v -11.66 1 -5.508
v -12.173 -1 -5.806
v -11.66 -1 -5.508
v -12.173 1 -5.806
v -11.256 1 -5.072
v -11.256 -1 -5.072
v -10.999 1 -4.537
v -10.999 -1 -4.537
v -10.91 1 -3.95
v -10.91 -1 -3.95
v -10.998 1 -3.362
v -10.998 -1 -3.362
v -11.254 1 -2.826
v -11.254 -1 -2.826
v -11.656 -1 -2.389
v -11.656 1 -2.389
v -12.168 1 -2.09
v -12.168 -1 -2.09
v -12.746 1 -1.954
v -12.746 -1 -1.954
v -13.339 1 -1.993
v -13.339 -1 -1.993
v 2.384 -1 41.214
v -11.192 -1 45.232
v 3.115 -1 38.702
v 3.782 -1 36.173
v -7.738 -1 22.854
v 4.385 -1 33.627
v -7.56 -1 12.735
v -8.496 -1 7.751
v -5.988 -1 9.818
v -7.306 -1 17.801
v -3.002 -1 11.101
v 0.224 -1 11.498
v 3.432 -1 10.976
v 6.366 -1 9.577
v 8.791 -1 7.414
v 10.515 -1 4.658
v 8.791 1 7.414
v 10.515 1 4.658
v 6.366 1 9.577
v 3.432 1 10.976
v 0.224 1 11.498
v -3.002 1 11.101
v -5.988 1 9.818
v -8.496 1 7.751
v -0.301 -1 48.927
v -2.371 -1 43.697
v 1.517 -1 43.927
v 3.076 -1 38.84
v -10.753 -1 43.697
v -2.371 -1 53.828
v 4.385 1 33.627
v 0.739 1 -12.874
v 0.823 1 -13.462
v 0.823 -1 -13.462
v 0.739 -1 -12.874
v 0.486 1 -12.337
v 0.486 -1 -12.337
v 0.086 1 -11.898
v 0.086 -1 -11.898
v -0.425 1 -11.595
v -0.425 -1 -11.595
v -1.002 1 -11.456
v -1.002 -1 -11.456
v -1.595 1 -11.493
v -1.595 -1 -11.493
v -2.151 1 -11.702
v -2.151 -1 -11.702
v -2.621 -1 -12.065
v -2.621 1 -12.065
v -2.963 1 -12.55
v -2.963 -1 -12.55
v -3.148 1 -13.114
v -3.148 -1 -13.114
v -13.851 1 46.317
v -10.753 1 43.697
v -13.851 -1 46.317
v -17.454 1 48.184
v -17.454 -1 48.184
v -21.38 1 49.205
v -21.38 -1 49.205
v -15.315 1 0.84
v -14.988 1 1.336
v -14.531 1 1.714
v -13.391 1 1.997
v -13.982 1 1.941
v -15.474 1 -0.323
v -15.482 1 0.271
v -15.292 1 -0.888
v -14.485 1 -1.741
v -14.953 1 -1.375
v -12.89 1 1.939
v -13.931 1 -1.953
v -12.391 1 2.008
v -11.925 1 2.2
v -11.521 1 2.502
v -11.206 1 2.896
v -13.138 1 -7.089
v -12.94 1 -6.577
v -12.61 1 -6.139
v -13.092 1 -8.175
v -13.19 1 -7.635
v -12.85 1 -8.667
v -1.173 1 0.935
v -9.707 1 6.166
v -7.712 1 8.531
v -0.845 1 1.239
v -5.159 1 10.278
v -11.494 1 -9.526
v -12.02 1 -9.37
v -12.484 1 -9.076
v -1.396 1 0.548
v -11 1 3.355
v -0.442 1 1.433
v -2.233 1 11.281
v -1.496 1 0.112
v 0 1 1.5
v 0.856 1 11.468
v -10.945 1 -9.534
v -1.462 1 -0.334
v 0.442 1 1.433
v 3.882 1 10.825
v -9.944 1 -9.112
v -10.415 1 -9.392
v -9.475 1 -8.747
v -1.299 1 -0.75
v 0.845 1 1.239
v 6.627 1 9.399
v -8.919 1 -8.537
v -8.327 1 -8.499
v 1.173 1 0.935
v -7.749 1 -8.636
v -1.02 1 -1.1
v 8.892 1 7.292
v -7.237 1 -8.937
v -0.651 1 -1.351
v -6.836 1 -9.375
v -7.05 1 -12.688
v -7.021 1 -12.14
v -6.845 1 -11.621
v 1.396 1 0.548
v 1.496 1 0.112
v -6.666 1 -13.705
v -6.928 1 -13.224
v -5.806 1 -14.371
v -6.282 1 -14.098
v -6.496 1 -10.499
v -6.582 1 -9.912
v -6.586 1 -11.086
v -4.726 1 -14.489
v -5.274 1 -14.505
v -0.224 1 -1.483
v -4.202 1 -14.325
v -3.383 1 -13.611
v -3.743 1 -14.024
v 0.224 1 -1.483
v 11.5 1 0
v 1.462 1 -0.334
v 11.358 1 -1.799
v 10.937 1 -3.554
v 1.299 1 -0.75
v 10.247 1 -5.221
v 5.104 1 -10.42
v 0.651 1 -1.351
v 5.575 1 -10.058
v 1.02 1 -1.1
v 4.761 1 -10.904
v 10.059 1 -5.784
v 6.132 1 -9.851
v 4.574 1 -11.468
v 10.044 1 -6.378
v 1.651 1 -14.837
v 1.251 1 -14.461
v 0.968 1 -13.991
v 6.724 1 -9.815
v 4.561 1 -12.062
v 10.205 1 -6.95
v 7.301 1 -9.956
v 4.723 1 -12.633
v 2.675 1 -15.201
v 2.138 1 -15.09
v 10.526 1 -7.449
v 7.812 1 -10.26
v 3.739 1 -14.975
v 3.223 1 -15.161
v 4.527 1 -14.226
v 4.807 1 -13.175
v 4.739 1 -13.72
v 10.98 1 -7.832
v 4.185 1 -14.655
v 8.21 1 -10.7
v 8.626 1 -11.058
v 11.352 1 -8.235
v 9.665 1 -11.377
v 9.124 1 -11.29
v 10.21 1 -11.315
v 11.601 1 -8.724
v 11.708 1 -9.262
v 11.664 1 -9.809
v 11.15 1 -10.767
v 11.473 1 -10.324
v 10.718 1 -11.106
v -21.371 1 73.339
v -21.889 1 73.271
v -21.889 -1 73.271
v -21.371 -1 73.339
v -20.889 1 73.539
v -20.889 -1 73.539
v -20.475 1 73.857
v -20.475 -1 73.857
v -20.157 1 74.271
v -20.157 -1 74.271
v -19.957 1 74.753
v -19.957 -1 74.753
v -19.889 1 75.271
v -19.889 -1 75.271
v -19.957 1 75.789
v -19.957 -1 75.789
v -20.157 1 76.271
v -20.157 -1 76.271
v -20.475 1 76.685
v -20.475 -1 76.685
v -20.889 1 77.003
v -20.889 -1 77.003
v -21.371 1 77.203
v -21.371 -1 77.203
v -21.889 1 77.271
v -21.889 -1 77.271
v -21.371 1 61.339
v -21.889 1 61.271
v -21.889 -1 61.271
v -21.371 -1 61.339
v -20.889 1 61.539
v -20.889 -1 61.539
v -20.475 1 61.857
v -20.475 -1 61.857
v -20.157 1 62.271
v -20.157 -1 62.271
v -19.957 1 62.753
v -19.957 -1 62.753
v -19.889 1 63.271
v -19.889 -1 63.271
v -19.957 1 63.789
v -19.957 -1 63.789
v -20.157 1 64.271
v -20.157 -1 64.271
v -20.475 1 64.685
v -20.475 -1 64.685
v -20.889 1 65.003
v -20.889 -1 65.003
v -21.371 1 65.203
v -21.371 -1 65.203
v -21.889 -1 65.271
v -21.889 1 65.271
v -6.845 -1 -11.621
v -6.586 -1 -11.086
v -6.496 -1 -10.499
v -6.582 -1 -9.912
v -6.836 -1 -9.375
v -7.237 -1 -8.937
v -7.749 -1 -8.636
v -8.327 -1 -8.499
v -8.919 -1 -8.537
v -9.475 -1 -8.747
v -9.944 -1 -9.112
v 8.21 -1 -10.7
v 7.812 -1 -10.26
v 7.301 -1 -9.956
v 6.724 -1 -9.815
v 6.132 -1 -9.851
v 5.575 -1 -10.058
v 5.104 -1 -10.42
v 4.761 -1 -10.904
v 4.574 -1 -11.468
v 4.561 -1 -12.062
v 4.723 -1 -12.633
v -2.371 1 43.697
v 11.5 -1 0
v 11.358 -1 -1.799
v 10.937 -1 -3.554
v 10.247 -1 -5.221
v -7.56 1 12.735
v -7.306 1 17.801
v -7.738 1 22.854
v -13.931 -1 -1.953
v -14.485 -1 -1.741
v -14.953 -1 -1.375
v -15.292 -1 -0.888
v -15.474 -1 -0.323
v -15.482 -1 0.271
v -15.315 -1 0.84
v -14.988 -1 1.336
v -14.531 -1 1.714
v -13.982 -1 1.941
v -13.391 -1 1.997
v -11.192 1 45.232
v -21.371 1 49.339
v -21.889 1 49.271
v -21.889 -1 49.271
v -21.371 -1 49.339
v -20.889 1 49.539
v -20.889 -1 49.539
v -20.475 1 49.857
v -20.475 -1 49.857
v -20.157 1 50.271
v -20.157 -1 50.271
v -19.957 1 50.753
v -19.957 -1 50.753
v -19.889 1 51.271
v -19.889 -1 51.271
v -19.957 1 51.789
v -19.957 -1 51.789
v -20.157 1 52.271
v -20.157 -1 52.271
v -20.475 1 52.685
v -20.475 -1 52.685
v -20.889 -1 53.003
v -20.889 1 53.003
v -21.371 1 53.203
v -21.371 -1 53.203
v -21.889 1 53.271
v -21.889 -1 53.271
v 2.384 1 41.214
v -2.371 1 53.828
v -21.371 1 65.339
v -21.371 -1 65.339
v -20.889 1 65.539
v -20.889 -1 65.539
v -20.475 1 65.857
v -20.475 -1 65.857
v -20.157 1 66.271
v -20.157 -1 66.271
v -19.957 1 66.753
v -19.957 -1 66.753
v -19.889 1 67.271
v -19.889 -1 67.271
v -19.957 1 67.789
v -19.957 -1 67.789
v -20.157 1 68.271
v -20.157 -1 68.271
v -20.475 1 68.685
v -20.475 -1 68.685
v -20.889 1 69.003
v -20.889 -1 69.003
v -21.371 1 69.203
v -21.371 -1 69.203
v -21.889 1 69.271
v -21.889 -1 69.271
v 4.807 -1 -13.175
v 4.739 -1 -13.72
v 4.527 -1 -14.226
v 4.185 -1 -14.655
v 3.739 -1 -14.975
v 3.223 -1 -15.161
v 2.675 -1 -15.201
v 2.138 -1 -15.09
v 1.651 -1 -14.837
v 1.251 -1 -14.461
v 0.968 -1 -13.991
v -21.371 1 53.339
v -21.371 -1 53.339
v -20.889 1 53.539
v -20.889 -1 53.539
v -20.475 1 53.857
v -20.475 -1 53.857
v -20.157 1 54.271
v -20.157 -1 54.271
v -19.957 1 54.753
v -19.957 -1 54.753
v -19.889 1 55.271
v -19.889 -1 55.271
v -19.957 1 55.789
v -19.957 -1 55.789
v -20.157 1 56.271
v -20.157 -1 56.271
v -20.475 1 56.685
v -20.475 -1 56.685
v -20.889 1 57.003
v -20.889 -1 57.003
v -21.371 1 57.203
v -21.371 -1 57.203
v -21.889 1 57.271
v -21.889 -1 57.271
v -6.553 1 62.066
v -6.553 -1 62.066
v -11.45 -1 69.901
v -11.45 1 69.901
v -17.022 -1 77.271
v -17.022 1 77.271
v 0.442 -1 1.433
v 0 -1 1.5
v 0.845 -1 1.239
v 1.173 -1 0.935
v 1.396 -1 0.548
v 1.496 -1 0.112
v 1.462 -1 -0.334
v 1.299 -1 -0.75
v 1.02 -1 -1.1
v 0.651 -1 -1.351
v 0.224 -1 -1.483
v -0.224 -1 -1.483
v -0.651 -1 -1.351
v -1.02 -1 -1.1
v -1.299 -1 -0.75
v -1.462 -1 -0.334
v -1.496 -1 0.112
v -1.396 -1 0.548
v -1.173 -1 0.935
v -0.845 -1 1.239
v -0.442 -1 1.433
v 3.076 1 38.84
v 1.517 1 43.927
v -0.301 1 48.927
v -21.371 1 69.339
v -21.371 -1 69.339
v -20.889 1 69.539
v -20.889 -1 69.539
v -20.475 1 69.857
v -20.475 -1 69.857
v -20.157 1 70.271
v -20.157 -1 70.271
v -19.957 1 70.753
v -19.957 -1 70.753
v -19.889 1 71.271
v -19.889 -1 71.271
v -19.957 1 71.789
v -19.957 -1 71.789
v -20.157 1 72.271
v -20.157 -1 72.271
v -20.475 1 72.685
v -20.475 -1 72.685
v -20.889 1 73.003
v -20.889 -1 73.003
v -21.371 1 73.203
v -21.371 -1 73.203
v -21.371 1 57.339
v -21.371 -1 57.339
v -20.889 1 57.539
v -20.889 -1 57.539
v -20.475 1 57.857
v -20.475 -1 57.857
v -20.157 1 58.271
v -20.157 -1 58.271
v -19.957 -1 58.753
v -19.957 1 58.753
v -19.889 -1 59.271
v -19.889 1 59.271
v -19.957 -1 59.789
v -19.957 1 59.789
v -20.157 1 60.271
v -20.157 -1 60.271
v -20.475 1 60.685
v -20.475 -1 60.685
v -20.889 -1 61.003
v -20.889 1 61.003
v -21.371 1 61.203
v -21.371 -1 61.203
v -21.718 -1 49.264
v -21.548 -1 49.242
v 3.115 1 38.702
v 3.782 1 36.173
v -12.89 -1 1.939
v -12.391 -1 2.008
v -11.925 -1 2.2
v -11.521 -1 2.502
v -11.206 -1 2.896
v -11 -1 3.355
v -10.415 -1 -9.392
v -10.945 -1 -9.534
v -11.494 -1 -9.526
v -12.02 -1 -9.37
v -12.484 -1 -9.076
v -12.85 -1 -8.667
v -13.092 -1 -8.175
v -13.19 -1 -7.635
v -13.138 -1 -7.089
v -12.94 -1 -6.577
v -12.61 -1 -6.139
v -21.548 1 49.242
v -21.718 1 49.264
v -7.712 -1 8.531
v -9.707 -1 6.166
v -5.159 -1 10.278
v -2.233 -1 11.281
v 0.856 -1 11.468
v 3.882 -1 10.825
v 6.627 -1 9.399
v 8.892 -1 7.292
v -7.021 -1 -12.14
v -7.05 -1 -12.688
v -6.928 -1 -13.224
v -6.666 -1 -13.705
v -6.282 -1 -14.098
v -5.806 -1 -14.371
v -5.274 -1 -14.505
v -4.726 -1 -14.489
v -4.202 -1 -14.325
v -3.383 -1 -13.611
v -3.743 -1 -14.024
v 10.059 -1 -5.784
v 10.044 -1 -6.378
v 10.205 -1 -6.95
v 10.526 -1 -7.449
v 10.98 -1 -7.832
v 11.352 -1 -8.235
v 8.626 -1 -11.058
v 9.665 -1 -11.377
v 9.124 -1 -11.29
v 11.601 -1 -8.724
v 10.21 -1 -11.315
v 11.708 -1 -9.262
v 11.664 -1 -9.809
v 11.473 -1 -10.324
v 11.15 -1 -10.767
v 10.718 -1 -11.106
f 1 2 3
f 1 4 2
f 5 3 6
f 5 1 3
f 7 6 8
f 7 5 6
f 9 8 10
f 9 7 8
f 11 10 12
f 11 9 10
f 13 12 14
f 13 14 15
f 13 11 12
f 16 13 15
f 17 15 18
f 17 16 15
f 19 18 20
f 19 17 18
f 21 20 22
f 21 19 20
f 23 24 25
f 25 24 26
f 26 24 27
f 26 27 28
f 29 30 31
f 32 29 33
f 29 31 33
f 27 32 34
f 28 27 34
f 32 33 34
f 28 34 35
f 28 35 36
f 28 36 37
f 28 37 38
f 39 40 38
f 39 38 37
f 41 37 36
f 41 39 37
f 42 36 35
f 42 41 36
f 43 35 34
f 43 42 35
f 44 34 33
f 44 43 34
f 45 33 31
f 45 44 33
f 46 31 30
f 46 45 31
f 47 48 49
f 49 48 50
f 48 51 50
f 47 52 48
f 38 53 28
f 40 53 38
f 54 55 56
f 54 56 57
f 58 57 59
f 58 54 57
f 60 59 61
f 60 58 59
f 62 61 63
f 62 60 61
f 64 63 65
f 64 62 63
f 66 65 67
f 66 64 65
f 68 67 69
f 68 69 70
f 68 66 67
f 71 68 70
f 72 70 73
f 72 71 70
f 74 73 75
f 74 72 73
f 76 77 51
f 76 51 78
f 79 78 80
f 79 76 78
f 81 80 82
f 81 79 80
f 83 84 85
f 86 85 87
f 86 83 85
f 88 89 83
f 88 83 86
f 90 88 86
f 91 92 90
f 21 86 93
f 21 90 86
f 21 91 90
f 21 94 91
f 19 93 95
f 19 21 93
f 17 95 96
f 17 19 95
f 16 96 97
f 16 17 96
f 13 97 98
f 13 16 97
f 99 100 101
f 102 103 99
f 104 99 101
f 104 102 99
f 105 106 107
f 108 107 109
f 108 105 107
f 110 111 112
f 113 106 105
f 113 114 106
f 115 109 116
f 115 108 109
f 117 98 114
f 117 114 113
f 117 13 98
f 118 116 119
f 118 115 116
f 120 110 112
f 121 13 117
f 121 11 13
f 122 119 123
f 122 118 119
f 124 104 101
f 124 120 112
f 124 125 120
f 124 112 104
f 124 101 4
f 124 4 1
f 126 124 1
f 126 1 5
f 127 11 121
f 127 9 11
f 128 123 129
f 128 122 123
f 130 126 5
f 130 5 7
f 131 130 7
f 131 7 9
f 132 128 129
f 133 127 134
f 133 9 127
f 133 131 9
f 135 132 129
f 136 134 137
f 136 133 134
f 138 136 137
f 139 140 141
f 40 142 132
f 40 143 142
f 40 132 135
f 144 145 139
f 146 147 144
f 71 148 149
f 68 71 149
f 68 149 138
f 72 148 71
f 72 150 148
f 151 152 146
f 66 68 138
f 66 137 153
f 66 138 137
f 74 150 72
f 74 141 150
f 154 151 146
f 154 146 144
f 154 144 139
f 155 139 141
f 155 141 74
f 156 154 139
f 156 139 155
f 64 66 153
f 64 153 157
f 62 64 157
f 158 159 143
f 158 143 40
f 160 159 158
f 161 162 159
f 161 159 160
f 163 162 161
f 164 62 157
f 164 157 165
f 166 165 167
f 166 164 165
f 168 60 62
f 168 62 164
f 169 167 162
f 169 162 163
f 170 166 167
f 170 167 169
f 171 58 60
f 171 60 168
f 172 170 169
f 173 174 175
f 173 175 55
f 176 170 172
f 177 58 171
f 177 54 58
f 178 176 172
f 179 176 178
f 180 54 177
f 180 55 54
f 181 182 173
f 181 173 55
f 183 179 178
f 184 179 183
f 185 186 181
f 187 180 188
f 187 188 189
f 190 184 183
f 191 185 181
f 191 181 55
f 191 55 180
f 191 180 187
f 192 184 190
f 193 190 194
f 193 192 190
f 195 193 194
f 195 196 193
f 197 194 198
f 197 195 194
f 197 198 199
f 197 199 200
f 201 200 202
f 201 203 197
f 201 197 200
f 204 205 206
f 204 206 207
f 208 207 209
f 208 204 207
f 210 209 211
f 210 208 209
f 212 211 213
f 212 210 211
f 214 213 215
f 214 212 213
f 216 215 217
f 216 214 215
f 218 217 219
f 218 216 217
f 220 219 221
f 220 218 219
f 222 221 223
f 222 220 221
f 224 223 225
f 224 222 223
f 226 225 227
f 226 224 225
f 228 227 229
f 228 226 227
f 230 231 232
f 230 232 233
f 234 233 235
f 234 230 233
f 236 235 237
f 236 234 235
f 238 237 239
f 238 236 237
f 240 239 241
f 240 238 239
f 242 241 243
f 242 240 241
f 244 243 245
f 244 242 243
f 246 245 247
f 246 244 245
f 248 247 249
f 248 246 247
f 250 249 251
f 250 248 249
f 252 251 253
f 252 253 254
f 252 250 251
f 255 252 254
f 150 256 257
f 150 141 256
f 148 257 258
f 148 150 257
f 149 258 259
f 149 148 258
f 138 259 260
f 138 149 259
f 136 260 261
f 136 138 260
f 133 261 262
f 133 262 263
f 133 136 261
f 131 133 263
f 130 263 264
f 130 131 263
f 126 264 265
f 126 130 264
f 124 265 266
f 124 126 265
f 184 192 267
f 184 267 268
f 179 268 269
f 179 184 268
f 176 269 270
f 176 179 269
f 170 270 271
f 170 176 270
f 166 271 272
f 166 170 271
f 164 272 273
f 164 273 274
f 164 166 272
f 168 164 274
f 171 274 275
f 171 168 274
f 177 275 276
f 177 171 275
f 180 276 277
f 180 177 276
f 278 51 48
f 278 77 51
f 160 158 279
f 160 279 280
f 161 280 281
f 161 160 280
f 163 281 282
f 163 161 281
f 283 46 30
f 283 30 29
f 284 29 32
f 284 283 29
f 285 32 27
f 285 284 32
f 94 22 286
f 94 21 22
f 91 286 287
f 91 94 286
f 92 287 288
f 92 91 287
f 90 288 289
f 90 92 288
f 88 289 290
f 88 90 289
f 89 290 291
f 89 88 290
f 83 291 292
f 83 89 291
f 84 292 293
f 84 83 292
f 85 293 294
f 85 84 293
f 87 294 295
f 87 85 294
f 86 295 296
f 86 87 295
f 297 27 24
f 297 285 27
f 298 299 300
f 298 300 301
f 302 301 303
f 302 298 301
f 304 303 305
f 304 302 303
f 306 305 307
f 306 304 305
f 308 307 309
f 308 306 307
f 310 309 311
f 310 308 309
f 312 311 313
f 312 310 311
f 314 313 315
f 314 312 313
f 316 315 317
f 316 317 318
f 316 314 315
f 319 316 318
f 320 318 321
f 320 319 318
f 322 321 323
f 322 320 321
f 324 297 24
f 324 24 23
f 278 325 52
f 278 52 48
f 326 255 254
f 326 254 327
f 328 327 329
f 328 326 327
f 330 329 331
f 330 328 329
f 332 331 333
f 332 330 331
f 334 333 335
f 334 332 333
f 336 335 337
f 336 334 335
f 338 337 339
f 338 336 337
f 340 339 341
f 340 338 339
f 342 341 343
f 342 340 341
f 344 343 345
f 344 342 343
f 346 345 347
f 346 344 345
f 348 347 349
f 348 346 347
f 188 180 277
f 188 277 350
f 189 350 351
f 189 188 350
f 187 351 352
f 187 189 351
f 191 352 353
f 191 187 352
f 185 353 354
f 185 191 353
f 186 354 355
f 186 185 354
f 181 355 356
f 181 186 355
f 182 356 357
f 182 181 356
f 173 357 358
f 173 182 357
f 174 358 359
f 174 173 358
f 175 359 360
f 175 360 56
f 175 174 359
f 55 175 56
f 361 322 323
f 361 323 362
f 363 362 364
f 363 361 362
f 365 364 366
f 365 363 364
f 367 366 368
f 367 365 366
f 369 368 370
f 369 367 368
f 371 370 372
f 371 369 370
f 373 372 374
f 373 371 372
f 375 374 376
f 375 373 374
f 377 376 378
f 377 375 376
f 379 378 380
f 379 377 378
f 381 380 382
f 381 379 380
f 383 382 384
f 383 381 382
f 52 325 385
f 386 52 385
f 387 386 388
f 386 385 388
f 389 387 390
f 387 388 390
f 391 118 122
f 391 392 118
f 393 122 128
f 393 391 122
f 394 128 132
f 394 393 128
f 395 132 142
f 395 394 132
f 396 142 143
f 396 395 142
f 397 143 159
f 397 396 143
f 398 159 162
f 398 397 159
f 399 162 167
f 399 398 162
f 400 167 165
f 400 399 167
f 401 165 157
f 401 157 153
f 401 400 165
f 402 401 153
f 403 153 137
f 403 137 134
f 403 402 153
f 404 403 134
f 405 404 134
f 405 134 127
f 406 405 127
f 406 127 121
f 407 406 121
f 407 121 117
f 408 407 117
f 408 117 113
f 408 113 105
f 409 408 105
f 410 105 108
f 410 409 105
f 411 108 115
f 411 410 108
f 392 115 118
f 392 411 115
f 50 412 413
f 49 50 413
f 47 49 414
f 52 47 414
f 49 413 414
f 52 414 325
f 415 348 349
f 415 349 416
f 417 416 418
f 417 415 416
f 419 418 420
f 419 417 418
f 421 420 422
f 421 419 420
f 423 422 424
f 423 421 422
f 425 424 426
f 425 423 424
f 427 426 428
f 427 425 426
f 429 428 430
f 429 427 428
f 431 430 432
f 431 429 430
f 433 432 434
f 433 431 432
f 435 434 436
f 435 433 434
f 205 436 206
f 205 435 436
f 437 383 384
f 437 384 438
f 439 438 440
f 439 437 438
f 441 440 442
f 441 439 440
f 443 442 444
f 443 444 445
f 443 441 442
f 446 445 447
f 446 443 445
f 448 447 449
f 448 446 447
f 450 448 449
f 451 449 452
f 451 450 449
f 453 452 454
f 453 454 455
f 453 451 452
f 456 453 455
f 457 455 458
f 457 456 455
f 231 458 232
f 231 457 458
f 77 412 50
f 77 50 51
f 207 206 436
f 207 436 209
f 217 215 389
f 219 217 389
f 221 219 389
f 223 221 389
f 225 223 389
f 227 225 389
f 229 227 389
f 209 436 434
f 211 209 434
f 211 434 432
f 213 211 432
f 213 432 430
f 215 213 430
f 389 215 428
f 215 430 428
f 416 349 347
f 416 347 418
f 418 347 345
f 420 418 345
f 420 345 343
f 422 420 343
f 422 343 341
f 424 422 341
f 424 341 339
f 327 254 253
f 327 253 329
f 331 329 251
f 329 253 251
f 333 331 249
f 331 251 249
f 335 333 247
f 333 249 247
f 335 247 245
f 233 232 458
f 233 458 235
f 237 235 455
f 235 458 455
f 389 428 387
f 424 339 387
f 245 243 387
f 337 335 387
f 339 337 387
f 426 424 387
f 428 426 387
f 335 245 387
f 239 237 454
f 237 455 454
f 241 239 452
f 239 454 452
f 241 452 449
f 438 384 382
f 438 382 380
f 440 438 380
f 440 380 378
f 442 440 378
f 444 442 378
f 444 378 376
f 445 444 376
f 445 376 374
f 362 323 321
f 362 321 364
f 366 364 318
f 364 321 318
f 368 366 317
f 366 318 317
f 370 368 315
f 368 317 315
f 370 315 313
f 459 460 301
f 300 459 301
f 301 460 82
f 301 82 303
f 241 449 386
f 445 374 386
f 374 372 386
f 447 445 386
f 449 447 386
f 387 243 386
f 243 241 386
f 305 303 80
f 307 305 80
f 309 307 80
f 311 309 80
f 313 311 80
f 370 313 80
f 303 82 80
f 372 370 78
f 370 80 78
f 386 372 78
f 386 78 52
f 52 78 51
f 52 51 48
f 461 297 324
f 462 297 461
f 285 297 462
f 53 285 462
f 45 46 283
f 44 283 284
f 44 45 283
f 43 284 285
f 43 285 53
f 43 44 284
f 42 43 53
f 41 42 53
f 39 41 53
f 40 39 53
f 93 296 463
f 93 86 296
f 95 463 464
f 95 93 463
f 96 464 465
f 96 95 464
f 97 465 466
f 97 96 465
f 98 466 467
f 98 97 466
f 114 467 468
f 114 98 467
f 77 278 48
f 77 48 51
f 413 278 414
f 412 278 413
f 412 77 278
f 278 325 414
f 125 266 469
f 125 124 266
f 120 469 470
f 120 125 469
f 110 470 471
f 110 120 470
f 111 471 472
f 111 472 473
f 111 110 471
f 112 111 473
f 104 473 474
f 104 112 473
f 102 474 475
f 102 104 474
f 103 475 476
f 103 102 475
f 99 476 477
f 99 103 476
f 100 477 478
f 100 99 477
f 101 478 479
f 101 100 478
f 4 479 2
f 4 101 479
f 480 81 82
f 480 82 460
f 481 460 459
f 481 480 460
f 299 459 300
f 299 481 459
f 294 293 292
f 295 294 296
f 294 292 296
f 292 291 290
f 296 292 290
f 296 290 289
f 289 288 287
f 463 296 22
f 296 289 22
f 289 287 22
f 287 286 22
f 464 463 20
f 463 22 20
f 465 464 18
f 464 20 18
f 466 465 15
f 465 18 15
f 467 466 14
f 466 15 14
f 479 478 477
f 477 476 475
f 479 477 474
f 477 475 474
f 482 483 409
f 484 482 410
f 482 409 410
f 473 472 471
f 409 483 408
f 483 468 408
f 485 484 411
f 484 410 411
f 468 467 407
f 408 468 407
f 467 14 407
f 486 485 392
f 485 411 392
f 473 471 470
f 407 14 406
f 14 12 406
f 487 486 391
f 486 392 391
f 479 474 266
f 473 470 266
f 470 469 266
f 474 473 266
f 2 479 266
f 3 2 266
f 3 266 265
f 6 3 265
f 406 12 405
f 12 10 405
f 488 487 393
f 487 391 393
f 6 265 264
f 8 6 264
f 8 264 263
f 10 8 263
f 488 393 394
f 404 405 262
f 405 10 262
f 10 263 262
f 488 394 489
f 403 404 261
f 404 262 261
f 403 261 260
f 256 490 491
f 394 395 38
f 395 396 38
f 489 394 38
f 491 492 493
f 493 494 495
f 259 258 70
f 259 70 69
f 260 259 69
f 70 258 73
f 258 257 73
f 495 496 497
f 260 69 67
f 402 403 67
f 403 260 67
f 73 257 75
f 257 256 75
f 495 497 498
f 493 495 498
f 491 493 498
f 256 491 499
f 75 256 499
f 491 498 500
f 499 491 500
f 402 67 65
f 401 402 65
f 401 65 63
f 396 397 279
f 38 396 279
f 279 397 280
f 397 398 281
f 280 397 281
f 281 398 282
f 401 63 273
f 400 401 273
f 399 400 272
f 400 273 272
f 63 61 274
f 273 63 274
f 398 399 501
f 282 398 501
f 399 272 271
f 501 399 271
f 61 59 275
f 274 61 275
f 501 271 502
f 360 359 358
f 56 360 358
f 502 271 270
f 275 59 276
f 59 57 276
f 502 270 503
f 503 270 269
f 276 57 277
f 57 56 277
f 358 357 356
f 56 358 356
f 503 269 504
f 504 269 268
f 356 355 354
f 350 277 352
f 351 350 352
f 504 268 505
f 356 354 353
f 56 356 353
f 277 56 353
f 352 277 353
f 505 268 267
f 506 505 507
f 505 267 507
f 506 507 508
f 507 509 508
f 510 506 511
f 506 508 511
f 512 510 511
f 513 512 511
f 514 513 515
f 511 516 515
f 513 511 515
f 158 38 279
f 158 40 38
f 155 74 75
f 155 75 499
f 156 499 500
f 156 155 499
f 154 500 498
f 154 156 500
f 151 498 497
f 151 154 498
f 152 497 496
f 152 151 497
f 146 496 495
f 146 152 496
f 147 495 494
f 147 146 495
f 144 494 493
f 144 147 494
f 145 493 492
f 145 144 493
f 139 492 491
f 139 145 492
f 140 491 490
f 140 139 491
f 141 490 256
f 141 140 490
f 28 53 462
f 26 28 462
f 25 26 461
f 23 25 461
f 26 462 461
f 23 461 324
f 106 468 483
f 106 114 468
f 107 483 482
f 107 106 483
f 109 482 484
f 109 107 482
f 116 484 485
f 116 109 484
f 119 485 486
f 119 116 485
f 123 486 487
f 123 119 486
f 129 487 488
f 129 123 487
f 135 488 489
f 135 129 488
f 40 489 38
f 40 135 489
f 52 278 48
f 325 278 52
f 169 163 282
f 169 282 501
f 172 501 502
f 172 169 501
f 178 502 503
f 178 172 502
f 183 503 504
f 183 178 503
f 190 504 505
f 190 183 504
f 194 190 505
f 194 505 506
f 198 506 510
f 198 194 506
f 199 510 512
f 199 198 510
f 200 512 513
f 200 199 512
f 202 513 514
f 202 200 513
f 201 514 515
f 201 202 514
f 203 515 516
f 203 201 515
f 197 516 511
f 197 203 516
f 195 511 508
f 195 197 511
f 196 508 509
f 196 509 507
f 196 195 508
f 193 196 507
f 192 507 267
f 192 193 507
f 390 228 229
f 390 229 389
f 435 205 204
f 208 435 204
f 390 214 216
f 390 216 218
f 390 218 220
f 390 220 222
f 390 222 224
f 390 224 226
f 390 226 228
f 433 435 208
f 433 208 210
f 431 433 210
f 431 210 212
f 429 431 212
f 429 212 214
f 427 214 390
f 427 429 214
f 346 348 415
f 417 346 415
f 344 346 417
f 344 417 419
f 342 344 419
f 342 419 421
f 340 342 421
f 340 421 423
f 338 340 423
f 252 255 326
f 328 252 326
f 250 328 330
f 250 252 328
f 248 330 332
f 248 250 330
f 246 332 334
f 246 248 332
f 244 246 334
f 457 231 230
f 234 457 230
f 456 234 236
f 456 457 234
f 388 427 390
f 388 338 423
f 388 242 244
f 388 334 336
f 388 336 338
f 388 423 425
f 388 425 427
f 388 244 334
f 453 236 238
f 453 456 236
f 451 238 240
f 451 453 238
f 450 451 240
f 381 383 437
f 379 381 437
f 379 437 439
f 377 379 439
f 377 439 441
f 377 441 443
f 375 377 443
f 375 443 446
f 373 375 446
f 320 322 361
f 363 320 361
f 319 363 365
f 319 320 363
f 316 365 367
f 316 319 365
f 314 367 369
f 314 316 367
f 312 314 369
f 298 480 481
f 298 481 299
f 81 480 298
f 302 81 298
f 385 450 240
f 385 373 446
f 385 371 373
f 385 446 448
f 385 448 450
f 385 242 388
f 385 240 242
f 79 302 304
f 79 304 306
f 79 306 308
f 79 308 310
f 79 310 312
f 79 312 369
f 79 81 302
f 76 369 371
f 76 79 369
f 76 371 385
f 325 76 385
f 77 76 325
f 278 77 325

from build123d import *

# Parameters (mm, degrees)
SKETCH1_R           = 1.5
BOSS_EXTRUDE3_DEPTH = 1
BOSS_EXTRUDE5_DEPTH = 1
BOSS_EXTRUDE7_DEPTH = 1
BOSS_EXTRUDE8_DEPTH = 1
CUT_EXTRUDE2_DEPTH  = 1


with BuildPart() as part:
    # Sketch1 → Boss-Extrude3 (new, symmetric)
    with BuildSketch(Plane(origin=(0, 0, 0), x_dir=(1, 0, 0), z_dir=(0, 1, 0))):
        with BuildLine():
            Line((10.514574075, -4.657653059), (11.5, 0))
            ThreePointArc((11.5, 0), (11.182254086, 2.684621677), (10.246575035, 5.220890734))
            ThreePointArc((10.246575035, 5.220890734), (10.1030879, 6.669657352), (10.979881559, 7.831873403))
            ThreePointArc((10.979881559, 7.831873403), (11.149766905, 10.767204742), (8.210294777, 10.699864472))
            ThreePointArc((8.210294777, 10.699864472), (5.575310633, 10.058126632), (4.723206327, 12.632789163))
            ThreePointArc((4.723206327, 12.632789163), (3.222631208, 15.161287811), (0.823354571, 13.461728244))
            ThreePointArc((0.823354571, 13.461728244), (-1.002291042, 11.456239028), (-3.148450543, 13.114240322))
            ThreePointArc((-3.148450543, 13.114240322), (-5.806402198, 14.371349746), (-6.845111027, 11.620692539))
            ThreePointArc((-6.845111027, 11.620692539), (-7.237184497, 8.937178557), (-9.943573918, 9.111606762))
            ThreePointArc((-9.943573918, 9.111606762), (-12.850082375, 8.667490004), (-12.173063031, 5.806253224))
            ThreePointArc((-12.173063031, 5.806253224), (-10.997504694, 3.362274604), (-13.338742224, 1.993488382))
            ThreePointArc((-13.338742224, 1.993488382), (-15.499826972, 0.026307423), (-13.391237031, -1.997040464))
            ThreePointArc((-13.391237031, -1.997040464), (-11.9248669, -2.199836984), (-10.999611474, -3.3553759))
            ThreePointArc((-10.999611474, -3.3553759), (-0.694835786, -11.478989643), (10.514574075, -4.657653059))
        make_face()
        with Locations(Location((0, 0, 0), (0, 0, 270))):
            Circle(SKETCH1_R, mode=Mode.SUBTRACT)
    extrude(amount=BOSS_EXTRUDE3_DEPTH, both=True)


with BuildPart() as body_2:
    # Sketch1<5> → Boss-Extrude5 (new, symmetric)
    with BuildSketch(Plane(origin=(0, 0, 0), x_dir=(1, 0, 0), z_dir=(0, 1, 0))):
        with BuildLine():
            Line((2.806807826, -41.088702969), (10.514574075, -4.657653059))
            ThreePointArc((10.514574075, -4.657653059), (1.846708509, -11.35075626), (-8.495825279, -7.750545324))
            ThreePointArc((-8.495825279, -7.750545324), (-7.347088724, -15.263704681), (-7.738414168, -22.854094893))
            Line((-7.738414168, -22.854094893), (-11.192007229, -45.231550072))
            Line((-11.192007229, -45.231550072), (2.806807826, -41.088702969))
        make_face()
    extrude(amount=BOSS_EXTRUDE5_DEPTH, both=True)


with BuildPart() as body_3:
    # Sketch2 → Boss-Extrude7 (new, symmetric)
    with BuildSketch(Plane(origin=(0, 0, 0), x_dir=(1, 0, 0), z_dir=(0, 1, 0))):
        with BuildLine():
            Line((-2.371433126, -72.667068493), (-2.371433126, -43.697049279))
            Line((-2.371433126, -43.697049279), (-10.753114724, -43.697049279))
            ThreePointArc((-10.753114724, -43.697049279), (-15.600240159, -47.350930238), (-21.380122364, -49.205231385))
            ThreePointArc((-21.380122364, -49.205231385), (-21.632355968, -49.254495275), (-21.888824426, -49.271007455))
            ThreePointArc((-21.888824426, -49.271007455), (-20.474610864, -49.856793893), (-19.888824426, -51.271007455))
            ThreePointArc((-19.888824426, -51.271007455), (-20.474610864, -52.685221018), (-21.888824426, -53.271007455))
            ThreePointArc((-21.888824426, -53.271007455), (-20.474610864, -53.856793893), (-19.888824426, -55.271007455))
            ThreePointArc((-19.888824426, -55.271007455), (-20.474610866, -56.68522102), (-21.888824433, -57.271007455))
            ThreePointArc((-21.888824433, -57.271007455), (-20.474610866, -57.85679389), (-19.888824426, -59.271007455))
            ThreePointArc((-19.888824426, -59.271007455), (-20.474610864, -60.685221018), (-21.888824426, -61.271007455))
            ThreePointArc((-21.888824426, -61.271007455), (-20.474610864, -61.856793893), (-19.888824426, -63.271007455))
            ThreePointArc((-19.888824426, -63.271007455), (-20.474610864, -64.685221018), (-21.888824426, -65.271007455))
            ThreePointArc((-21.888824426, -65.271007455), (-20.474610864, -65.856793893), (-19.888824426, -67.271007455))
            ThreePointArc((-19.888824426, -67.271007455), (-20.474610864, -68.685221018), (-21.888824426, -69.271007455))
            ThreePointArc((-21.888824426, -69.271007455), (-20.474610864, -69.856793893), (-19.888824426, -71.271007455))
            ThreePointArc((-19.888824426, -71.271007455), (-20.474610864, -72.685221018), (-21.888824426, -73.271007455))
            ThreePointArc((-21.888824426, -73.271007455), (-20.474610864, -73.856793893), (-19.888824426, -75.271007455))
            ThreePointArc((-19.888824426, -75.271007455), (-20.474610864, -76.685221018), (-21.888824426, -77.271007455))
            Line((-21.888824426, -77.271007455), (-12.155084024, -77.271007455))
            ThreePointArc((-12.155084024, -77.271007455), (-6.995429189, -75.538191741), (-2.371433126, -72.667068493))
        make_face()
    extrude(amount=BOSS_EXTRUDE7_DEPTH, both=True)


with BuildPart() as body_4:
    # Sketch2<5> → Boss-Extrude8 (new, symmetric)
    with BuildSketch(Plane(origin=(0, 0, 0), x_dir=(1, 0, 0), z_dir=(0, 1, 0))):
        Polygon((-10.753114724, -43.697049279), (-2.371433126, -43.697049279), (-2.371433126, -72.667068493), (3.384279509, -38.732055606), align=None)
    extrude(amount=BOSS_EXTRUDE8_DEPTH, both=True)


with BuildPart() as cut_extrude2_tool:
    # Sketch3 → Cut-Extrude2 (new, symmetric)
    with BuildSketch(Plane(origin=(0, 0, 0), x_dir=(1, 0, 0), z_dir=(0, 1, 0))):
        with BuildLine():
            Line((-17.021954225, -77.271007455), (4.891566987, -77.271007455))
            Line((4.891566987, -77.271007455), (4.891566987, -31.235009619))
            ThreePointArc((4.891566987, -31.235009619), (-3.20178666, -55.616014274), (-17.021954225, -77.271007455))
        make_face()
    extrude(amount=CUT_EXTRUDE2_DEPTH, both=True)


with BuildPart() as body_2_1:
    add(body_2.part)

    # Cut-Extrude2: cut by cut_extrude2_tool
    add(cut_extrude2_tool.part, mode=Mode.SUBTRACT)


with BuildPart() as body_3_1:
    add(body_3.part)

    # Cut-Extrude2: cut by cut_extrude2_tool
    add(cut_extrude2_tool.part, mode=Mode.SUBTRACT)


with BuildPart() as body_4_1:
    add(body_4.part)

    # Cut-Extrude2: cut by cut_extrude2_tool
    add(cut_extrude2_tool.part, mode=Mode.SUBTRACT)


solid = Compound([part.part, body_2_1.part, body_3_1.part, body_4_1.part])
